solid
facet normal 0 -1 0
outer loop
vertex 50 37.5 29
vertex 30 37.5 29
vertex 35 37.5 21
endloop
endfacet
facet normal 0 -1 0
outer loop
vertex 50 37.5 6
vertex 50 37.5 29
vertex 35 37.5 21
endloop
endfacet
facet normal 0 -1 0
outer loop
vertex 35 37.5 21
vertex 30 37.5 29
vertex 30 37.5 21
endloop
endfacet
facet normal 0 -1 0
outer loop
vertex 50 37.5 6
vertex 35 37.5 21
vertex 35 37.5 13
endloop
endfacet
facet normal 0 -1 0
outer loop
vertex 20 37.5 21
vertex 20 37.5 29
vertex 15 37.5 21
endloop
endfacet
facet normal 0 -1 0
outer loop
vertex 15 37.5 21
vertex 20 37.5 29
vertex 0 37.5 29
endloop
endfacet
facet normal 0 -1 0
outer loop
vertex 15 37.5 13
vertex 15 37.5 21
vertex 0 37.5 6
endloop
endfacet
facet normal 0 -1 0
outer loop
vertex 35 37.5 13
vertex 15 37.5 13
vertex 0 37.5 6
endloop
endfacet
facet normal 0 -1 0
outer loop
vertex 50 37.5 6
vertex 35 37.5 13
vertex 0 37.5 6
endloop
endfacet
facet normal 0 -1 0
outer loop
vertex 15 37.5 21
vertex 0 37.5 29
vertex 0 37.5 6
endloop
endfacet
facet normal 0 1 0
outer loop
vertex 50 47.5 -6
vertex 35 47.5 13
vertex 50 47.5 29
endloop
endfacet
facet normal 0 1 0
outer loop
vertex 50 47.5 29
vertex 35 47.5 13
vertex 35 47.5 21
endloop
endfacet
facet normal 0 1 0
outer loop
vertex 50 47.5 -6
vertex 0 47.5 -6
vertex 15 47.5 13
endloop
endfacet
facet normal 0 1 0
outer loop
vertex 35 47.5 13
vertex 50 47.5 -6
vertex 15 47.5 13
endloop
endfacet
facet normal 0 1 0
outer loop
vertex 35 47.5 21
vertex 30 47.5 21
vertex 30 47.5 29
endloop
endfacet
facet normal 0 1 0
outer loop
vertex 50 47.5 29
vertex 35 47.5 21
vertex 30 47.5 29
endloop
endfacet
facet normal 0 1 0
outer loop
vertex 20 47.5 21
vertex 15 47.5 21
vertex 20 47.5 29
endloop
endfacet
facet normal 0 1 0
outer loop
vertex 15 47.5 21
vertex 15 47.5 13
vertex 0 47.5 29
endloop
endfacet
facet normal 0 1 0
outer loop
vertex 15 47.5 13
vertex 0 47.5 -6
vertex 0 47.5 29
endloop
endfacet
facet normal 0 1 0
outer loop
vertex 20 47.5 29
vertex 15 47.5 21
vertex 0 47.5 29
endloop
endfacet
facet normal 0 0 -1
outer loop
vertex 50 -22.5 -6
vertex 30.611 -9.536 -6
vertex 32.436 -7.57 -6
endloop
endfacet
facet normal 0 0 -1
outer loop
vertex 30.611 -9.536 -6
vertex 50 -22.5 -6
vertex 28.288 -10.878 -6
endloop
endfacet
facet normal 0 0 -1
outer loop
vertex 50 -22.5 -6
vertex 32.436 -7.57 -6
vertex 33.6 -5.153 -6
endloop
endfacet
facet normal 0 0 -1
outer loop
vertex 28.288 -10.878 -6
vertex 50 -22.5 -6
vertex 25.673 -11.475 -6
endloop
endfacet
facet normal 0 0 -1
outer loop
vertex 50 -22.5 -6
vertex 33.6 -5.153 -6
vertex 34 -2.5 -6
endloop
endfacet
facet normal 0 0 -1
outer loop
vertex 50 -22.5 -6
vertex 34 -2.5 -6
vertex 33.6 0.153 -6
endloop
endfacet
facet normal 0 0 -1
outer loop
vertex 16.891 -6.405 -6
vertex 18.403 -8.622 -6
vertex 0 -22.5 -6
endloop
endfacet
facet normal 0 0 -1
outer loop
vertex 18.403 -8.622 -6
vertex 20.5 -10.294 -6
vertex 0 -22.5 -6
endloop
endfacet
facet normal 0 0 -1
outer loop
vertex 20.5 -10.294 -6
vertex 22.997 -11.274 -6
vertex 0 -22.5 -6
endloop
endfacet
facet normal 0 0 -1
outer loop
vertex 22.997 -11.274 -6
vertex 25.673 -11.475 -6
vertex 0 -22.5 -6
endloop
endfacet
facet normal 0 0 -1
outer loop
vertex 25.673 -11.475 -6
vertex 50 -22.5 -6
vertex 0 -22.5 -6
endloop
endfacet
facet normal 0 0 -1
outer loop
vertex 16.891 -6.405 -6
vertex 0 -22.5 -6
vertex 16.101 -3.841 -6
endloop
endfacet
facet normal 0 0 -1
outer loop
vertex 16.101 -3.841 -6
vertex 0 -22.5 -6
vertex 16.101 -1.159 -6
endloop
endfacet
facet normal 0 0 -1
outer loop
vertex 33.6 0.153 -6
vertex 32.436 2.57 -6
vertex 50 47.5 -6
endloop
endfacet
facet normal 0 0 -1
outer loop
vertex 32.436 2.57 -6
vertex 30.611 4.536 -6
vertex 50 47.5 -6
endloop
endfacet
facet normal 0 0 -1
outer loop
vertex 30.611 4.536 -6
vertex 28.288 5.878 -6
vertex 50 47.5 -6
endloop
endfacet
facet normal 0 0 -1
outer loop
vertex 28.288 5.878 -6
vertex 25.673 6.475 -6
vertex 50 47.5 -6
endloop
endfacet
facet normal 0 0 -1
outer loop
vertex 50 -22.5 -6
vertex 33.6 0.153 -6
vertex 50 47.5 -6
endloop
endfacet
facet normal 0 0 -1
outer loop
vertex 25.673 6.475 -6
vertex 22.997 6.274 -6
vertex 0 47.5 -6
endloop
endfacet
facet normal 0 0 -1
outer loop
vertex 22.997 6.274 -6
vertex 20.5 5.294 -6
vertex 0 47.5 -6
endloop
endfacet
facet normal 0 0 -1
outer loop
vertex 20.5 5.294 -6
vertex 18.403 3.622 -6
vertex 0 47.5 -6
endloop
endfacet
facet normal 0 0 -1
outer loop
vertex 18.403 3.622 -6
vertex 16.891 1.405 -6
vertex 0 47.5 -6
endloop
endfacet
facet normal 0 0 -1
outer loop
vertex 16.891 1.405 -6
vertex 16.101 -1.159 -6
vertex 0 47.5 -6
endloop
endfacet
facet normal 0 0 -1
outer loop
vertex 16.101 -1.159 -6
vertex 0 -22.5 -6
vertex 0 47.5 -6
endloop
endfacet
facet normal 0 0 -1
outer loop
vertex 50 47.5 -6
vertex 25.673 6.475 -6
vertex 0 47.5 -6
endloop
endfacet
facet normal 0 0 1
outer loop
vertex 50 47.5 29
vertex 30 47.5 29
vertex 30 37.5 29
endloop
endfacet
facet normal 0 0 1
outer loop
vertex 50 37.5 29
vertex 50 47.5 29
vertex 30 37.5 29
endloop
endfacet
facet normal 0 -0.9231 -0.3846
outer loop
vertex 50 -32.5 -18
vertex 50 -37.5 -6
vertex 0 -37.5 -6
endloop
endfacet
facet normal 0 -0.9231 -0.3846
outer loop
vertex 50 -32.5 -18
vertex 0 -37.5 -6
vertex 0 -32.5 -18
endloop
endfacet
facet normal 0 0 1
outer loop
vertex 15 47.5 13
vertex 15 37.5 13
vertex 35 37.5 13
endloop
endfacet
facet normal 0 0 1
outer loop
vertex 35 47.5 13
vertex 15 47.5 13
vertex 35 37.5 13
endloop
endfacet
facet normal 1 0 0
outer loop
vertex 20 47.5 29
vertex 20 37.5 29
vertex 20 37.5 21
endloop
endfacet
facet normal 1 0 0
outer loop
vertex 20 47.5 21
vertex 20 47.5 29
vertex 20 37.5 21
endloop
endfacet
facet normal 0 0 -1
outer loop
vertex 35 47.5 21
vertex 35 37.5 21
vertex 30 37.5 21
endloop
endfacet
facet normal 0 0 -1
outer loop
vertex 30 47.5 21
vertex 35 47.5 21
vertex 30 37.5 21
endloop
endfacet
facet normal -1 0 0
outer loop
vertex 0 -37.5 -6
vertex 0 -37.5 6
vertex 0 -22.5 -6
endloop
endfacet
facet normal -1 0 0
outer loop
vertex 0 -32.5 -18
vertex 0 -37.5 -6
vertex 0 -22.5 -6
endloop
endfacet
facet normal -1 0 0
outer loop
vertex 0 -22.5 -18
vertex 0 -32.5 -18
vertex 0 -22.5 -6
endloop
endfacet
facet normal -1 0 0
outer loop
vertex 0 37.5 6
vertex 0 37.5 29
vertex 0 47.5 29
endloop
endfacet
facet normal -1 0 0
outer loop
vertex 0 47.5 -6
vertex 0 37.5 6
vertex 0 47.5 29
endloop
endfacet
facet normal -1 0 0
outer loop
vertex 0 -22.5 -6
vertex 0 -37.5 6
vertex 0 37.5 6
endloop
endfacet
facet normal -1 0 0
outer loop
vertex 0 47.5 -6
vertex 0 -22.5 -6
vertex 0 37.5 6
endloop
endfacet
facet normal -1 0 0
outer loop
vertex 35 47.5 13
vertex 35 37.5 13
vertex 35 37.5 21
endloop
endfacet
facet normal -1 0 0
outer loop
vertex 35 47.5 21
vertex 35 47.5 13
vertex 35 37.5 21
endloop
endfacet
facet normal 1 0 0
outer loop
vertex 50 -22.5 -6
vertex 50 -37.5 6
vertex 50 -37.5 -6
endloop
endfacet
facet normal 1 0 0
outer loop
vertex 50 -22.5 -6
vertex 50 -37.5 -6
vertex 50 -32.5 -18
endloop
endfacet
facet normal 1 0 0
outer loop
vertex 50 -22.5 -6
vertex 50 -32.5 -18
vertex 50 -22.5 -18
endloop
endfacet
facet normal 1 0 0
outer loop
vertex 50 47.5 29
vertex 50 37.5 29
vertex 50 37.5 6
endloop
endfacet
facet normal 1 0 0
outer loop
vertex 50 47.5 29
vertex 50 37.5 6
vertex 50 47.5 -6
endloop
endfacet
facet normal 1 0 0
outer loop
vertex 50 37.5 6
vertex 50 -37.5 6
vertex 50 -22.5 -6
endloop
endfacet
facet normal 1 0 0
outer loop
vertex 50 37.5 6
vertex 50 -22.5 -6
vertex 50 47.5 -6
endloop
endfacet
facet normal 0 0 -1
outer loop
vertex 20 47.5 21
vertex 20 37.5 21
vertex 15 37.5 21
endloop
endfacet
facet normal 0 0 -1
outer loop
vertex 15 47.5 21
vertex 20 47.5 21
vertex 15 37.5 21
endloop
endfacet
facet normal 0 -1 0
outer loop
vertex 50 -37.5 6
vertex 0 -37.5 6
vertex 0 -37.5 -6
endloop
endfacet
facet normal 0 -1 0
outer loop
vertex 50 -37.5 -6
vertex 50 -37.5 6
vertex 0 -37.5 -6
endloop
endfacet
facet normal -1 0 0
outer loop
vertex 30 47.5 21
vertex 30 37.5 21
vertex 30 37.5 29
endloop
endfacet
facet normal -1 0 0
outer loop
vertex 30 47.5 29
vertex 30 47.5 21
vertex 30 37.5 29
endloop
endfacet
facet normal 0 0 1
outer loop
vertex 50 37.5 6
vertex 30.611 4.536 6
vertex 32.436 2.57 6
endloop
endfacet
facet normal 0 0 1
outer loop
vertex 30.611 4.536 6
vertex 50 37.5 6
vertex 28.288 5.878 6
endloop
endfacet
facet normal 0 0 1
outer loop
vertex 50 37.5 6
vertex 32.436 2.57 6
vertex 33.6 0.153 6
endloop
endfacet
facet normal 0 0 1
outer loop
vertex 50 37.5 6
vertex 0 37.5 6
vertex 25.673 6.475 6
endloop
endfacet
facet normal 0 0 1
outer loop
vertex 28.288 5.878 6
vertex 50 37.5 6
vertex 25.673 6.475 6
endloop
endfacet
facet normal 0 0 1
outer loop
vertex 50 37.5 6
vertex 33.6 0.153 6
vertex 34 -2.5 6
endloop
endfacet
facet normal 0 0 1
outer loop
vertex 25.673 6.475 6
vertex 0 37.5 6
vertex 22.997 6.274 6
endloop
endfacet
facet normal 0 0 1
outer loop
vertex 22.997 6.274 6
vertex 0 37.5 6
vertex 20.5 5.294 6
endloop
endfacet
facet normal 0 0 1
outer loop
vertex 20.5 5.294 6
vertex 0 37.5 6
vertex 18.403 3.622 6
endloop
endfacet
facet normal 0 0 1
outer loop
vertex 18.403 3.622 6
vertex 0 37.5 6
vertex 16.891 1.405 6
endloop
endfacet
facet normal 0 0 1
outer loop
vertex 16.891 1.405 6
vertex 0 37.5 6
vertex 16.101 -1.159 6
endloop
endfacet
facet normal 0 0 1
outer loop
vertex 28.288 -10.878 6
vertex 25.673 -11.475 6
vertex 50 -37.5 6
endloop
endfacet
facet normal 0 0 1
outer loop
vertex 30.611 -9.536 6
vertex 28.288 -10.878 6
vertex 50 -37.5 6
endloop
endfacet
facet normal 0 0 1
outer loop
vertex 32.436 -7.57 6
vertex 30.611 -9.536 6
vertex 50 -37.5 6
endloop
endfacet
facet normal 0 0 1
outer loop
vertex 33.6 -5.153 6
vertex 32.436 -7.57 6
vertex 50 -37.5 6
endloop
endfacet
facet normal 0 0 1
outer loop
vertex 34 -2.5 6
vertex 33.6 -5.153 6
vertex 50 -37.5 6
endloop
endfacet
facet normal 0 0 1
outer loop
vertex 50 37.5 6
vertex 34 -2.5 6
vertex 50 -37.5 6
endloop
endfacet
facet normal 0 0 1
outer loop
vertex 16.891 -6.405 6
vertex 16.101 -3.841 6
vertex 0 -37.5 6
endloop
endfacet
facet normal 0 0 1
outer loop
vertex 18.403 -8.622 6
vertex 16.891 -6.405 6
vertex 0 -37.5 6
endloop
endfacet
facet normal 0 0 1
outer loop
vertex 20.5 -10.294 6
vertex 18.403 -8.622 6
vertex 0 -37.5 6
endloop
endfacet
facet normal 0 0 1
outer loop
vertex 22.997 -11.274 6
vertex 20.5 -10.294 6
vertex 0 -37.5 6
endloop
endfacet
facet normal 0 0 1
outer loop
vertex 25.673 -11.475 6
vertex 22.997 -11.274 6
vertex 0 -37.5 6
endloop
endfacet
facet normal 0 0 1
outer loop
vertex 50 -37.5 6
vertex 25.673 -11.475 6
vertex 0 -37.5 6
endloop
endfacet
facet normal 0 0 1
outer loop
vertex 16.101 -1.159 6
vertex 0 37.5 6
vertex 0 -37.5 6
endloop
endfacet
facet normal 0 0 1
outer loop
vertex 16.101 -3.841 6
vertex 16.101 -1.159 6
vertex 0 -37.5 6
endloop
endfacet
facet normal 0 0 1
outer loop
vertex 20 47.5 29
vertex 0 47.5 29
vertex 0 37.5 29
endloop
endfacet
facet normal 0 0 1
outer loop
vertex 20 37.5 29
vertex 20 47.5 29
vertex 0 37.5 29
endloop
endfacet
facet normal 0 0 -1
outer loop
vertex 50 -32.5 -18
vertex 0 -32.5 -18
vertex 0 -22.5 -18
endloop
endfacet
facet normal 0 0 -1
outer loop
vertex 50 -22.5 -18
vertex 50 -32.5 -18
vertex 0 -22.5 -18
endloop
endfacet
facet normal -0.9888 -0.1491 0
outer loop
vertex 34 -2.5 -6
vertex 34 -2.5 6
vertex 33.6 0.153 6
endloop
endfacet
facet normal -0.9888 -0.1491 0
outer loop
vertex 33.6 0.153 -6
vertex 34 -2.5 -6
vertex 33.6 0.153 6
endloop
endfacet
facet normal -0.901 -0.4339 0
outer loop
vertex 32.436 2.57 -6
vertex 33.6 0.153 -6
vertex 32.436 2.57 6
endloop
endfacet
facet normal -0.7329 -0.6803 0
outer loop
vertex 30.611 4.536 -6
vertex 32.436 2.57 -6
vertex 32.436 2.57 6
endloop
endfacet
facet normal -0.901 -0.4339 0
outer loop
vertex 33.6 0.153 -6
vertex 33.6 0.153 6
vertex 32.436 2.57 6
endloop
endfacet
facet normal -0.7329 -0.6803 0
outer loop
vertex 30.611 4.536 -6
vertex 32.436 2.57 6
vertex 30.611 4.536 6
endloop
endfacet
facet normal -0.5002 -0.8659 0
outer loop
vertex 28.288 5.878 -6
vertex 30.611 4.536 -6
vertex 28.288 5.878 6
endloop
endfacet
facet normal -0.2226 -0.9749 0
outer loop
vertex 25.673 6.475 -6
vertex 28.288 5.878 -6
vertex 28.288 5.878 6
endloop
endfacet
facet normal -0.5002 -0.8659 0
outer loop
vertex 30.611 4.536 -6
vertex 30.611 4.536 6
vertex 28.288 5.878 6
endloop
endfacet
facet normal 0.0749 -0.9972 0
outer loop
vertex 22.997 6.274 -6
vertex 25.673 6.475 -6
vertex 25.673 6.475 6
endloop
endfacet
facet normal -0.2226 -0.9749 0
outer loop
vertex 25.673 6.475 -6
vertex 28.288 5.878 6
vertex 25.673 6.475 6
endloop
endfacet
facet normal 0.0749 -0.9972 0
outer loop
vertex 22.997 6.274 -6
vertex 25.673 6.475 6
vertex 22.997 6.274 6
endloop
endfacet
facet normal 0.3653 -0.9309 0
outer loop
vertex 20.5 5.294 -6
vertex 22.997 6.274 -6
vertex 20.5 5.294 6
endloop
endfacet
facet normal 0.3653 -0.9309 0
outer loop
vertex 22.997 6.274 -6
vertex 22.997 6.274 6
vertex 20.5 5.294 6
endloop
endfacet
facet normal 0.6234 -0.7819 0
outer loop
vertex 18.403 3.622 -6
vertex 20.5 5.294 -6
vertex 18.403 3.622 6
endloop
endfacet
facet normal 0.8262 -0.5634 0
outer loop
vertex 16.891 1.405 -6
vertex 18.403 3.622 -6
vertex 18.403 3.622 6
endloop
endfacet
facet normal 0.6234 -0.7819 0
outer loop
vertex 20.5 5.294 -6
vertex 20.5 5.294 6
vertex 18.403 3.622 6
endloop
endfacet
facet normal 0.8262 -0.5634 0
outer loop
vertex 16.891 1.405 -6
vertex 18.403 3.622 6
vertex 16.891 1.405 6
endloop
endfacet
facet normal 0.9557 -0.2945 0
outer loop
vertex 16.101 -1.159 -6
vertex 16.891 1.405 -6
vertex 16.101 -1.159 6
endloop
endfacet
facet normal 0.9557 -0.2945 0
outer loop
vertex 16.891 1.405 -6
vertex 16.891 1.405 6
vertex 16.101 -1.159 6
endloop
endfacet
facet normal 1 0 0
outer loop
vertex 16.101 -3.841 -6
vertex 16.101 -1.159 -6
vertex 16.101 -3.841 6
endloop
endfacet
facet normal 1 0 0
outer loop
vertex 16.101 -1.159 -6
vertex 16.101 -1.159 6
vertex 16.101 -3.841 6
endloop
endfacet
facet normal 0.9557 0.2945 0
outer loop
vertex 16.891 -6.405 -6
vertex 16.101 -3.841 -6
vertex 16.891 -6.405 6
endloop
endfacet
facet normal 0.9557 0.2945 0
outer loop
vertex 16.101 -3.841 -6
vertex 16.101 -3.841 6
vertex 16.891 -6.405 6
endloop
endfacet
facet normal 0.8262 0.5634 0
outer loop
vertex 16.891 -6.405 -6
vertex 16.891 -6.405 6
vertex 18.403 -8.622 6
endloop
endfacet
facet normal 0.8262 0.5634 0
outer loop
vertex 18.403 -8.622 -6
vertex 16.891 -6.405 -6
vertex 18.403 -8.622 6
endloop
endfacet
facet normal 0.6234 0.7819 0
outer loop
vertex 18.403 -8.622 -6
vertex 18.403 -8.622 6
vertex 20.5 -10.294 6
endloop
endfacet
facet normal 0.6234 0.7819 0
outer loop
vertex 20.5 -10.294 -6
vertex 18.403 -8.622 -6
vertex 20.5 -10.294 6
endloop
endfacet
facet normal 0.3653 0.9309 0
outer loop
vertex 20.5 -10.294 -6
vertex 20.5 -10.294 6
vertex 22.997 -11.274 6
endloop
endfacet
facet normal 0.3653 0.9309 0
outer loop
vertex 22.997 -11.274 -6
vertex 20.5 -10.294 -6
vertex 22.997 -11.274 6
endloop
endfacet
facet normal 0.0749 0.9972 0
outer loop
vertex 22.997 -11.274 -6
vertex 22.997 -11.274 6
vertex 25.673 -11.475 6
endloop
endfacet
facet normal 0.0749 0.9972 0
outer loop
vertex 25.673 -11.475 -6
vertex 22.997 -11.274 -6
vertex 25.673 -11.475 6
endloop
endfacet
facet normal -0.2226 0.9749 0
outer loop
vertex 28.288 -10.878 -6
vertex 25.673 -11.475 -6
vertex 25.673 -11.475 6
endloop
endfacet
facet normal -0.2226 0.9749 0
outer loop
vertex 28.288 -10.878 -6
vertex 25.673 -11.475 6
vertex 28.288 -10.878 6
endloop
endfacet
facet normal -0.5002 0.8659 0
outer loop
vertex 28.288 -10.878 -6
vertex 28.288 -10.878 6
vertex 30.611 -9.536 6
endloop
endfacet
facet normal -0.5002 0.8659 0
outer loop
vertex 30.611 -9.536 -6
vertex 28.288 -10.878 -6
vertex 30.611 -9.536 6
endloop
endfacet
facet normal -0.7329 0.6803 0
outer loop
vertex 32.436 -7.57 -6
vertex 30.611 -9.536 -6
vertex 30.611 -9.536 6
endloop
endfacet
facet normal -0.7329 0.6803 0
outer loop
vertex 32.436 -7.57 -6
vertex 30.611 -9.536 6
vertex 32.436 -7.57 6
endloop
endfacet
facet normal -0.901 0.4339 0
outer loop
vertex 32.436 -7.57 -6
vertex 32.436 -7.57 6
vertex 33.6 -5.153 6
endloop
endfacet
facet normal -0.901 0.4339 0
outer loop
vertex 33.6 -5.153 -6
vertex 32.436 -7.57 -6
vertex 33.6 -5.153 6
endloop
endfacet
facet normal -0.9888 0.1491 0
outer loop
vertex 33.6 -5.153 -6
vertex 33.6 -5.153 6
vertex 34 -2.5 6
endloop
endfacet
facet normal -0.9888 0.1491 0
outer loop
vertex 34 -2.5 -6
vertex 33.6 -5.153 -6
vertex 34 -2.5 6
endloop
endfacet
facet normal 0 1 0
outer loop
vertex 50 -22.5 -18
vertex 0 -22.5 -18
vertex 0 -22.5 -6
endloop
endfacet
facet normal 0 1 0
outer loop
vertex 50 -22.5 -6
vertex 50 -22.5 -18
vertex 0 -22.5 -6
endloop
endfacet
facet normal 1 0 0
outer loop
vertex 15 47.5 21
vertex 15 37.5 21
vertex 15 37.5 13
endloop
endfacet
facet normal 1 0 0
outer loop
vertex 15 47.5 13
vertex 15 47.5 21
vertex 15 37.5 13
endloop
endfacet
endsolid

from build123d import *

# Parameters (mm, degrees)
F1_DEPTH = 50
F3_DEPTH = 25
F4_R     = 9
F5_DEPTH = 25


with BuildPart() as f1:
    # F0 (on Right) → F1 (new body)
    with BuildSketch(Plane.YZ):
        Polygon((37.5, -6), (37.5, 6), (-37.5, 6), (-37.5, -6), (-22.5, -6), align=None)
        Polygon((37.5, 29), (37.5, 6), (37.5, -6), (47.5, -6), (47.5, 29), align=None)
        Polygon((-22.5, -6), (-37.5, -6), (-32.5, -18), (-22.5, -18), align=None)
    extrude(amount=F1_DEPTH)

    # F2 (on face) → F3 (cut)
    with BuildSketch(Plane.XZ.offset(-37.5)):
        Polygon((30, 29), (20, 29), (20, 21), (15, 21), (15, 13), (35, 13), (35, 21), (30, 21), align=None)
    extrude(amount=-F3_DEPTH, mode=Mode.SUBTRACT)

    # F4 (on face) → F5 (cut)
    with BuildSketch(Plane.XY.offset(6)):
        with Locations((25, -2.5)):
            Circle(F4_R)
    extrude(amount=-F5_DEPTH, mode=Mode.SUBTRACT)


solid = f1.part
